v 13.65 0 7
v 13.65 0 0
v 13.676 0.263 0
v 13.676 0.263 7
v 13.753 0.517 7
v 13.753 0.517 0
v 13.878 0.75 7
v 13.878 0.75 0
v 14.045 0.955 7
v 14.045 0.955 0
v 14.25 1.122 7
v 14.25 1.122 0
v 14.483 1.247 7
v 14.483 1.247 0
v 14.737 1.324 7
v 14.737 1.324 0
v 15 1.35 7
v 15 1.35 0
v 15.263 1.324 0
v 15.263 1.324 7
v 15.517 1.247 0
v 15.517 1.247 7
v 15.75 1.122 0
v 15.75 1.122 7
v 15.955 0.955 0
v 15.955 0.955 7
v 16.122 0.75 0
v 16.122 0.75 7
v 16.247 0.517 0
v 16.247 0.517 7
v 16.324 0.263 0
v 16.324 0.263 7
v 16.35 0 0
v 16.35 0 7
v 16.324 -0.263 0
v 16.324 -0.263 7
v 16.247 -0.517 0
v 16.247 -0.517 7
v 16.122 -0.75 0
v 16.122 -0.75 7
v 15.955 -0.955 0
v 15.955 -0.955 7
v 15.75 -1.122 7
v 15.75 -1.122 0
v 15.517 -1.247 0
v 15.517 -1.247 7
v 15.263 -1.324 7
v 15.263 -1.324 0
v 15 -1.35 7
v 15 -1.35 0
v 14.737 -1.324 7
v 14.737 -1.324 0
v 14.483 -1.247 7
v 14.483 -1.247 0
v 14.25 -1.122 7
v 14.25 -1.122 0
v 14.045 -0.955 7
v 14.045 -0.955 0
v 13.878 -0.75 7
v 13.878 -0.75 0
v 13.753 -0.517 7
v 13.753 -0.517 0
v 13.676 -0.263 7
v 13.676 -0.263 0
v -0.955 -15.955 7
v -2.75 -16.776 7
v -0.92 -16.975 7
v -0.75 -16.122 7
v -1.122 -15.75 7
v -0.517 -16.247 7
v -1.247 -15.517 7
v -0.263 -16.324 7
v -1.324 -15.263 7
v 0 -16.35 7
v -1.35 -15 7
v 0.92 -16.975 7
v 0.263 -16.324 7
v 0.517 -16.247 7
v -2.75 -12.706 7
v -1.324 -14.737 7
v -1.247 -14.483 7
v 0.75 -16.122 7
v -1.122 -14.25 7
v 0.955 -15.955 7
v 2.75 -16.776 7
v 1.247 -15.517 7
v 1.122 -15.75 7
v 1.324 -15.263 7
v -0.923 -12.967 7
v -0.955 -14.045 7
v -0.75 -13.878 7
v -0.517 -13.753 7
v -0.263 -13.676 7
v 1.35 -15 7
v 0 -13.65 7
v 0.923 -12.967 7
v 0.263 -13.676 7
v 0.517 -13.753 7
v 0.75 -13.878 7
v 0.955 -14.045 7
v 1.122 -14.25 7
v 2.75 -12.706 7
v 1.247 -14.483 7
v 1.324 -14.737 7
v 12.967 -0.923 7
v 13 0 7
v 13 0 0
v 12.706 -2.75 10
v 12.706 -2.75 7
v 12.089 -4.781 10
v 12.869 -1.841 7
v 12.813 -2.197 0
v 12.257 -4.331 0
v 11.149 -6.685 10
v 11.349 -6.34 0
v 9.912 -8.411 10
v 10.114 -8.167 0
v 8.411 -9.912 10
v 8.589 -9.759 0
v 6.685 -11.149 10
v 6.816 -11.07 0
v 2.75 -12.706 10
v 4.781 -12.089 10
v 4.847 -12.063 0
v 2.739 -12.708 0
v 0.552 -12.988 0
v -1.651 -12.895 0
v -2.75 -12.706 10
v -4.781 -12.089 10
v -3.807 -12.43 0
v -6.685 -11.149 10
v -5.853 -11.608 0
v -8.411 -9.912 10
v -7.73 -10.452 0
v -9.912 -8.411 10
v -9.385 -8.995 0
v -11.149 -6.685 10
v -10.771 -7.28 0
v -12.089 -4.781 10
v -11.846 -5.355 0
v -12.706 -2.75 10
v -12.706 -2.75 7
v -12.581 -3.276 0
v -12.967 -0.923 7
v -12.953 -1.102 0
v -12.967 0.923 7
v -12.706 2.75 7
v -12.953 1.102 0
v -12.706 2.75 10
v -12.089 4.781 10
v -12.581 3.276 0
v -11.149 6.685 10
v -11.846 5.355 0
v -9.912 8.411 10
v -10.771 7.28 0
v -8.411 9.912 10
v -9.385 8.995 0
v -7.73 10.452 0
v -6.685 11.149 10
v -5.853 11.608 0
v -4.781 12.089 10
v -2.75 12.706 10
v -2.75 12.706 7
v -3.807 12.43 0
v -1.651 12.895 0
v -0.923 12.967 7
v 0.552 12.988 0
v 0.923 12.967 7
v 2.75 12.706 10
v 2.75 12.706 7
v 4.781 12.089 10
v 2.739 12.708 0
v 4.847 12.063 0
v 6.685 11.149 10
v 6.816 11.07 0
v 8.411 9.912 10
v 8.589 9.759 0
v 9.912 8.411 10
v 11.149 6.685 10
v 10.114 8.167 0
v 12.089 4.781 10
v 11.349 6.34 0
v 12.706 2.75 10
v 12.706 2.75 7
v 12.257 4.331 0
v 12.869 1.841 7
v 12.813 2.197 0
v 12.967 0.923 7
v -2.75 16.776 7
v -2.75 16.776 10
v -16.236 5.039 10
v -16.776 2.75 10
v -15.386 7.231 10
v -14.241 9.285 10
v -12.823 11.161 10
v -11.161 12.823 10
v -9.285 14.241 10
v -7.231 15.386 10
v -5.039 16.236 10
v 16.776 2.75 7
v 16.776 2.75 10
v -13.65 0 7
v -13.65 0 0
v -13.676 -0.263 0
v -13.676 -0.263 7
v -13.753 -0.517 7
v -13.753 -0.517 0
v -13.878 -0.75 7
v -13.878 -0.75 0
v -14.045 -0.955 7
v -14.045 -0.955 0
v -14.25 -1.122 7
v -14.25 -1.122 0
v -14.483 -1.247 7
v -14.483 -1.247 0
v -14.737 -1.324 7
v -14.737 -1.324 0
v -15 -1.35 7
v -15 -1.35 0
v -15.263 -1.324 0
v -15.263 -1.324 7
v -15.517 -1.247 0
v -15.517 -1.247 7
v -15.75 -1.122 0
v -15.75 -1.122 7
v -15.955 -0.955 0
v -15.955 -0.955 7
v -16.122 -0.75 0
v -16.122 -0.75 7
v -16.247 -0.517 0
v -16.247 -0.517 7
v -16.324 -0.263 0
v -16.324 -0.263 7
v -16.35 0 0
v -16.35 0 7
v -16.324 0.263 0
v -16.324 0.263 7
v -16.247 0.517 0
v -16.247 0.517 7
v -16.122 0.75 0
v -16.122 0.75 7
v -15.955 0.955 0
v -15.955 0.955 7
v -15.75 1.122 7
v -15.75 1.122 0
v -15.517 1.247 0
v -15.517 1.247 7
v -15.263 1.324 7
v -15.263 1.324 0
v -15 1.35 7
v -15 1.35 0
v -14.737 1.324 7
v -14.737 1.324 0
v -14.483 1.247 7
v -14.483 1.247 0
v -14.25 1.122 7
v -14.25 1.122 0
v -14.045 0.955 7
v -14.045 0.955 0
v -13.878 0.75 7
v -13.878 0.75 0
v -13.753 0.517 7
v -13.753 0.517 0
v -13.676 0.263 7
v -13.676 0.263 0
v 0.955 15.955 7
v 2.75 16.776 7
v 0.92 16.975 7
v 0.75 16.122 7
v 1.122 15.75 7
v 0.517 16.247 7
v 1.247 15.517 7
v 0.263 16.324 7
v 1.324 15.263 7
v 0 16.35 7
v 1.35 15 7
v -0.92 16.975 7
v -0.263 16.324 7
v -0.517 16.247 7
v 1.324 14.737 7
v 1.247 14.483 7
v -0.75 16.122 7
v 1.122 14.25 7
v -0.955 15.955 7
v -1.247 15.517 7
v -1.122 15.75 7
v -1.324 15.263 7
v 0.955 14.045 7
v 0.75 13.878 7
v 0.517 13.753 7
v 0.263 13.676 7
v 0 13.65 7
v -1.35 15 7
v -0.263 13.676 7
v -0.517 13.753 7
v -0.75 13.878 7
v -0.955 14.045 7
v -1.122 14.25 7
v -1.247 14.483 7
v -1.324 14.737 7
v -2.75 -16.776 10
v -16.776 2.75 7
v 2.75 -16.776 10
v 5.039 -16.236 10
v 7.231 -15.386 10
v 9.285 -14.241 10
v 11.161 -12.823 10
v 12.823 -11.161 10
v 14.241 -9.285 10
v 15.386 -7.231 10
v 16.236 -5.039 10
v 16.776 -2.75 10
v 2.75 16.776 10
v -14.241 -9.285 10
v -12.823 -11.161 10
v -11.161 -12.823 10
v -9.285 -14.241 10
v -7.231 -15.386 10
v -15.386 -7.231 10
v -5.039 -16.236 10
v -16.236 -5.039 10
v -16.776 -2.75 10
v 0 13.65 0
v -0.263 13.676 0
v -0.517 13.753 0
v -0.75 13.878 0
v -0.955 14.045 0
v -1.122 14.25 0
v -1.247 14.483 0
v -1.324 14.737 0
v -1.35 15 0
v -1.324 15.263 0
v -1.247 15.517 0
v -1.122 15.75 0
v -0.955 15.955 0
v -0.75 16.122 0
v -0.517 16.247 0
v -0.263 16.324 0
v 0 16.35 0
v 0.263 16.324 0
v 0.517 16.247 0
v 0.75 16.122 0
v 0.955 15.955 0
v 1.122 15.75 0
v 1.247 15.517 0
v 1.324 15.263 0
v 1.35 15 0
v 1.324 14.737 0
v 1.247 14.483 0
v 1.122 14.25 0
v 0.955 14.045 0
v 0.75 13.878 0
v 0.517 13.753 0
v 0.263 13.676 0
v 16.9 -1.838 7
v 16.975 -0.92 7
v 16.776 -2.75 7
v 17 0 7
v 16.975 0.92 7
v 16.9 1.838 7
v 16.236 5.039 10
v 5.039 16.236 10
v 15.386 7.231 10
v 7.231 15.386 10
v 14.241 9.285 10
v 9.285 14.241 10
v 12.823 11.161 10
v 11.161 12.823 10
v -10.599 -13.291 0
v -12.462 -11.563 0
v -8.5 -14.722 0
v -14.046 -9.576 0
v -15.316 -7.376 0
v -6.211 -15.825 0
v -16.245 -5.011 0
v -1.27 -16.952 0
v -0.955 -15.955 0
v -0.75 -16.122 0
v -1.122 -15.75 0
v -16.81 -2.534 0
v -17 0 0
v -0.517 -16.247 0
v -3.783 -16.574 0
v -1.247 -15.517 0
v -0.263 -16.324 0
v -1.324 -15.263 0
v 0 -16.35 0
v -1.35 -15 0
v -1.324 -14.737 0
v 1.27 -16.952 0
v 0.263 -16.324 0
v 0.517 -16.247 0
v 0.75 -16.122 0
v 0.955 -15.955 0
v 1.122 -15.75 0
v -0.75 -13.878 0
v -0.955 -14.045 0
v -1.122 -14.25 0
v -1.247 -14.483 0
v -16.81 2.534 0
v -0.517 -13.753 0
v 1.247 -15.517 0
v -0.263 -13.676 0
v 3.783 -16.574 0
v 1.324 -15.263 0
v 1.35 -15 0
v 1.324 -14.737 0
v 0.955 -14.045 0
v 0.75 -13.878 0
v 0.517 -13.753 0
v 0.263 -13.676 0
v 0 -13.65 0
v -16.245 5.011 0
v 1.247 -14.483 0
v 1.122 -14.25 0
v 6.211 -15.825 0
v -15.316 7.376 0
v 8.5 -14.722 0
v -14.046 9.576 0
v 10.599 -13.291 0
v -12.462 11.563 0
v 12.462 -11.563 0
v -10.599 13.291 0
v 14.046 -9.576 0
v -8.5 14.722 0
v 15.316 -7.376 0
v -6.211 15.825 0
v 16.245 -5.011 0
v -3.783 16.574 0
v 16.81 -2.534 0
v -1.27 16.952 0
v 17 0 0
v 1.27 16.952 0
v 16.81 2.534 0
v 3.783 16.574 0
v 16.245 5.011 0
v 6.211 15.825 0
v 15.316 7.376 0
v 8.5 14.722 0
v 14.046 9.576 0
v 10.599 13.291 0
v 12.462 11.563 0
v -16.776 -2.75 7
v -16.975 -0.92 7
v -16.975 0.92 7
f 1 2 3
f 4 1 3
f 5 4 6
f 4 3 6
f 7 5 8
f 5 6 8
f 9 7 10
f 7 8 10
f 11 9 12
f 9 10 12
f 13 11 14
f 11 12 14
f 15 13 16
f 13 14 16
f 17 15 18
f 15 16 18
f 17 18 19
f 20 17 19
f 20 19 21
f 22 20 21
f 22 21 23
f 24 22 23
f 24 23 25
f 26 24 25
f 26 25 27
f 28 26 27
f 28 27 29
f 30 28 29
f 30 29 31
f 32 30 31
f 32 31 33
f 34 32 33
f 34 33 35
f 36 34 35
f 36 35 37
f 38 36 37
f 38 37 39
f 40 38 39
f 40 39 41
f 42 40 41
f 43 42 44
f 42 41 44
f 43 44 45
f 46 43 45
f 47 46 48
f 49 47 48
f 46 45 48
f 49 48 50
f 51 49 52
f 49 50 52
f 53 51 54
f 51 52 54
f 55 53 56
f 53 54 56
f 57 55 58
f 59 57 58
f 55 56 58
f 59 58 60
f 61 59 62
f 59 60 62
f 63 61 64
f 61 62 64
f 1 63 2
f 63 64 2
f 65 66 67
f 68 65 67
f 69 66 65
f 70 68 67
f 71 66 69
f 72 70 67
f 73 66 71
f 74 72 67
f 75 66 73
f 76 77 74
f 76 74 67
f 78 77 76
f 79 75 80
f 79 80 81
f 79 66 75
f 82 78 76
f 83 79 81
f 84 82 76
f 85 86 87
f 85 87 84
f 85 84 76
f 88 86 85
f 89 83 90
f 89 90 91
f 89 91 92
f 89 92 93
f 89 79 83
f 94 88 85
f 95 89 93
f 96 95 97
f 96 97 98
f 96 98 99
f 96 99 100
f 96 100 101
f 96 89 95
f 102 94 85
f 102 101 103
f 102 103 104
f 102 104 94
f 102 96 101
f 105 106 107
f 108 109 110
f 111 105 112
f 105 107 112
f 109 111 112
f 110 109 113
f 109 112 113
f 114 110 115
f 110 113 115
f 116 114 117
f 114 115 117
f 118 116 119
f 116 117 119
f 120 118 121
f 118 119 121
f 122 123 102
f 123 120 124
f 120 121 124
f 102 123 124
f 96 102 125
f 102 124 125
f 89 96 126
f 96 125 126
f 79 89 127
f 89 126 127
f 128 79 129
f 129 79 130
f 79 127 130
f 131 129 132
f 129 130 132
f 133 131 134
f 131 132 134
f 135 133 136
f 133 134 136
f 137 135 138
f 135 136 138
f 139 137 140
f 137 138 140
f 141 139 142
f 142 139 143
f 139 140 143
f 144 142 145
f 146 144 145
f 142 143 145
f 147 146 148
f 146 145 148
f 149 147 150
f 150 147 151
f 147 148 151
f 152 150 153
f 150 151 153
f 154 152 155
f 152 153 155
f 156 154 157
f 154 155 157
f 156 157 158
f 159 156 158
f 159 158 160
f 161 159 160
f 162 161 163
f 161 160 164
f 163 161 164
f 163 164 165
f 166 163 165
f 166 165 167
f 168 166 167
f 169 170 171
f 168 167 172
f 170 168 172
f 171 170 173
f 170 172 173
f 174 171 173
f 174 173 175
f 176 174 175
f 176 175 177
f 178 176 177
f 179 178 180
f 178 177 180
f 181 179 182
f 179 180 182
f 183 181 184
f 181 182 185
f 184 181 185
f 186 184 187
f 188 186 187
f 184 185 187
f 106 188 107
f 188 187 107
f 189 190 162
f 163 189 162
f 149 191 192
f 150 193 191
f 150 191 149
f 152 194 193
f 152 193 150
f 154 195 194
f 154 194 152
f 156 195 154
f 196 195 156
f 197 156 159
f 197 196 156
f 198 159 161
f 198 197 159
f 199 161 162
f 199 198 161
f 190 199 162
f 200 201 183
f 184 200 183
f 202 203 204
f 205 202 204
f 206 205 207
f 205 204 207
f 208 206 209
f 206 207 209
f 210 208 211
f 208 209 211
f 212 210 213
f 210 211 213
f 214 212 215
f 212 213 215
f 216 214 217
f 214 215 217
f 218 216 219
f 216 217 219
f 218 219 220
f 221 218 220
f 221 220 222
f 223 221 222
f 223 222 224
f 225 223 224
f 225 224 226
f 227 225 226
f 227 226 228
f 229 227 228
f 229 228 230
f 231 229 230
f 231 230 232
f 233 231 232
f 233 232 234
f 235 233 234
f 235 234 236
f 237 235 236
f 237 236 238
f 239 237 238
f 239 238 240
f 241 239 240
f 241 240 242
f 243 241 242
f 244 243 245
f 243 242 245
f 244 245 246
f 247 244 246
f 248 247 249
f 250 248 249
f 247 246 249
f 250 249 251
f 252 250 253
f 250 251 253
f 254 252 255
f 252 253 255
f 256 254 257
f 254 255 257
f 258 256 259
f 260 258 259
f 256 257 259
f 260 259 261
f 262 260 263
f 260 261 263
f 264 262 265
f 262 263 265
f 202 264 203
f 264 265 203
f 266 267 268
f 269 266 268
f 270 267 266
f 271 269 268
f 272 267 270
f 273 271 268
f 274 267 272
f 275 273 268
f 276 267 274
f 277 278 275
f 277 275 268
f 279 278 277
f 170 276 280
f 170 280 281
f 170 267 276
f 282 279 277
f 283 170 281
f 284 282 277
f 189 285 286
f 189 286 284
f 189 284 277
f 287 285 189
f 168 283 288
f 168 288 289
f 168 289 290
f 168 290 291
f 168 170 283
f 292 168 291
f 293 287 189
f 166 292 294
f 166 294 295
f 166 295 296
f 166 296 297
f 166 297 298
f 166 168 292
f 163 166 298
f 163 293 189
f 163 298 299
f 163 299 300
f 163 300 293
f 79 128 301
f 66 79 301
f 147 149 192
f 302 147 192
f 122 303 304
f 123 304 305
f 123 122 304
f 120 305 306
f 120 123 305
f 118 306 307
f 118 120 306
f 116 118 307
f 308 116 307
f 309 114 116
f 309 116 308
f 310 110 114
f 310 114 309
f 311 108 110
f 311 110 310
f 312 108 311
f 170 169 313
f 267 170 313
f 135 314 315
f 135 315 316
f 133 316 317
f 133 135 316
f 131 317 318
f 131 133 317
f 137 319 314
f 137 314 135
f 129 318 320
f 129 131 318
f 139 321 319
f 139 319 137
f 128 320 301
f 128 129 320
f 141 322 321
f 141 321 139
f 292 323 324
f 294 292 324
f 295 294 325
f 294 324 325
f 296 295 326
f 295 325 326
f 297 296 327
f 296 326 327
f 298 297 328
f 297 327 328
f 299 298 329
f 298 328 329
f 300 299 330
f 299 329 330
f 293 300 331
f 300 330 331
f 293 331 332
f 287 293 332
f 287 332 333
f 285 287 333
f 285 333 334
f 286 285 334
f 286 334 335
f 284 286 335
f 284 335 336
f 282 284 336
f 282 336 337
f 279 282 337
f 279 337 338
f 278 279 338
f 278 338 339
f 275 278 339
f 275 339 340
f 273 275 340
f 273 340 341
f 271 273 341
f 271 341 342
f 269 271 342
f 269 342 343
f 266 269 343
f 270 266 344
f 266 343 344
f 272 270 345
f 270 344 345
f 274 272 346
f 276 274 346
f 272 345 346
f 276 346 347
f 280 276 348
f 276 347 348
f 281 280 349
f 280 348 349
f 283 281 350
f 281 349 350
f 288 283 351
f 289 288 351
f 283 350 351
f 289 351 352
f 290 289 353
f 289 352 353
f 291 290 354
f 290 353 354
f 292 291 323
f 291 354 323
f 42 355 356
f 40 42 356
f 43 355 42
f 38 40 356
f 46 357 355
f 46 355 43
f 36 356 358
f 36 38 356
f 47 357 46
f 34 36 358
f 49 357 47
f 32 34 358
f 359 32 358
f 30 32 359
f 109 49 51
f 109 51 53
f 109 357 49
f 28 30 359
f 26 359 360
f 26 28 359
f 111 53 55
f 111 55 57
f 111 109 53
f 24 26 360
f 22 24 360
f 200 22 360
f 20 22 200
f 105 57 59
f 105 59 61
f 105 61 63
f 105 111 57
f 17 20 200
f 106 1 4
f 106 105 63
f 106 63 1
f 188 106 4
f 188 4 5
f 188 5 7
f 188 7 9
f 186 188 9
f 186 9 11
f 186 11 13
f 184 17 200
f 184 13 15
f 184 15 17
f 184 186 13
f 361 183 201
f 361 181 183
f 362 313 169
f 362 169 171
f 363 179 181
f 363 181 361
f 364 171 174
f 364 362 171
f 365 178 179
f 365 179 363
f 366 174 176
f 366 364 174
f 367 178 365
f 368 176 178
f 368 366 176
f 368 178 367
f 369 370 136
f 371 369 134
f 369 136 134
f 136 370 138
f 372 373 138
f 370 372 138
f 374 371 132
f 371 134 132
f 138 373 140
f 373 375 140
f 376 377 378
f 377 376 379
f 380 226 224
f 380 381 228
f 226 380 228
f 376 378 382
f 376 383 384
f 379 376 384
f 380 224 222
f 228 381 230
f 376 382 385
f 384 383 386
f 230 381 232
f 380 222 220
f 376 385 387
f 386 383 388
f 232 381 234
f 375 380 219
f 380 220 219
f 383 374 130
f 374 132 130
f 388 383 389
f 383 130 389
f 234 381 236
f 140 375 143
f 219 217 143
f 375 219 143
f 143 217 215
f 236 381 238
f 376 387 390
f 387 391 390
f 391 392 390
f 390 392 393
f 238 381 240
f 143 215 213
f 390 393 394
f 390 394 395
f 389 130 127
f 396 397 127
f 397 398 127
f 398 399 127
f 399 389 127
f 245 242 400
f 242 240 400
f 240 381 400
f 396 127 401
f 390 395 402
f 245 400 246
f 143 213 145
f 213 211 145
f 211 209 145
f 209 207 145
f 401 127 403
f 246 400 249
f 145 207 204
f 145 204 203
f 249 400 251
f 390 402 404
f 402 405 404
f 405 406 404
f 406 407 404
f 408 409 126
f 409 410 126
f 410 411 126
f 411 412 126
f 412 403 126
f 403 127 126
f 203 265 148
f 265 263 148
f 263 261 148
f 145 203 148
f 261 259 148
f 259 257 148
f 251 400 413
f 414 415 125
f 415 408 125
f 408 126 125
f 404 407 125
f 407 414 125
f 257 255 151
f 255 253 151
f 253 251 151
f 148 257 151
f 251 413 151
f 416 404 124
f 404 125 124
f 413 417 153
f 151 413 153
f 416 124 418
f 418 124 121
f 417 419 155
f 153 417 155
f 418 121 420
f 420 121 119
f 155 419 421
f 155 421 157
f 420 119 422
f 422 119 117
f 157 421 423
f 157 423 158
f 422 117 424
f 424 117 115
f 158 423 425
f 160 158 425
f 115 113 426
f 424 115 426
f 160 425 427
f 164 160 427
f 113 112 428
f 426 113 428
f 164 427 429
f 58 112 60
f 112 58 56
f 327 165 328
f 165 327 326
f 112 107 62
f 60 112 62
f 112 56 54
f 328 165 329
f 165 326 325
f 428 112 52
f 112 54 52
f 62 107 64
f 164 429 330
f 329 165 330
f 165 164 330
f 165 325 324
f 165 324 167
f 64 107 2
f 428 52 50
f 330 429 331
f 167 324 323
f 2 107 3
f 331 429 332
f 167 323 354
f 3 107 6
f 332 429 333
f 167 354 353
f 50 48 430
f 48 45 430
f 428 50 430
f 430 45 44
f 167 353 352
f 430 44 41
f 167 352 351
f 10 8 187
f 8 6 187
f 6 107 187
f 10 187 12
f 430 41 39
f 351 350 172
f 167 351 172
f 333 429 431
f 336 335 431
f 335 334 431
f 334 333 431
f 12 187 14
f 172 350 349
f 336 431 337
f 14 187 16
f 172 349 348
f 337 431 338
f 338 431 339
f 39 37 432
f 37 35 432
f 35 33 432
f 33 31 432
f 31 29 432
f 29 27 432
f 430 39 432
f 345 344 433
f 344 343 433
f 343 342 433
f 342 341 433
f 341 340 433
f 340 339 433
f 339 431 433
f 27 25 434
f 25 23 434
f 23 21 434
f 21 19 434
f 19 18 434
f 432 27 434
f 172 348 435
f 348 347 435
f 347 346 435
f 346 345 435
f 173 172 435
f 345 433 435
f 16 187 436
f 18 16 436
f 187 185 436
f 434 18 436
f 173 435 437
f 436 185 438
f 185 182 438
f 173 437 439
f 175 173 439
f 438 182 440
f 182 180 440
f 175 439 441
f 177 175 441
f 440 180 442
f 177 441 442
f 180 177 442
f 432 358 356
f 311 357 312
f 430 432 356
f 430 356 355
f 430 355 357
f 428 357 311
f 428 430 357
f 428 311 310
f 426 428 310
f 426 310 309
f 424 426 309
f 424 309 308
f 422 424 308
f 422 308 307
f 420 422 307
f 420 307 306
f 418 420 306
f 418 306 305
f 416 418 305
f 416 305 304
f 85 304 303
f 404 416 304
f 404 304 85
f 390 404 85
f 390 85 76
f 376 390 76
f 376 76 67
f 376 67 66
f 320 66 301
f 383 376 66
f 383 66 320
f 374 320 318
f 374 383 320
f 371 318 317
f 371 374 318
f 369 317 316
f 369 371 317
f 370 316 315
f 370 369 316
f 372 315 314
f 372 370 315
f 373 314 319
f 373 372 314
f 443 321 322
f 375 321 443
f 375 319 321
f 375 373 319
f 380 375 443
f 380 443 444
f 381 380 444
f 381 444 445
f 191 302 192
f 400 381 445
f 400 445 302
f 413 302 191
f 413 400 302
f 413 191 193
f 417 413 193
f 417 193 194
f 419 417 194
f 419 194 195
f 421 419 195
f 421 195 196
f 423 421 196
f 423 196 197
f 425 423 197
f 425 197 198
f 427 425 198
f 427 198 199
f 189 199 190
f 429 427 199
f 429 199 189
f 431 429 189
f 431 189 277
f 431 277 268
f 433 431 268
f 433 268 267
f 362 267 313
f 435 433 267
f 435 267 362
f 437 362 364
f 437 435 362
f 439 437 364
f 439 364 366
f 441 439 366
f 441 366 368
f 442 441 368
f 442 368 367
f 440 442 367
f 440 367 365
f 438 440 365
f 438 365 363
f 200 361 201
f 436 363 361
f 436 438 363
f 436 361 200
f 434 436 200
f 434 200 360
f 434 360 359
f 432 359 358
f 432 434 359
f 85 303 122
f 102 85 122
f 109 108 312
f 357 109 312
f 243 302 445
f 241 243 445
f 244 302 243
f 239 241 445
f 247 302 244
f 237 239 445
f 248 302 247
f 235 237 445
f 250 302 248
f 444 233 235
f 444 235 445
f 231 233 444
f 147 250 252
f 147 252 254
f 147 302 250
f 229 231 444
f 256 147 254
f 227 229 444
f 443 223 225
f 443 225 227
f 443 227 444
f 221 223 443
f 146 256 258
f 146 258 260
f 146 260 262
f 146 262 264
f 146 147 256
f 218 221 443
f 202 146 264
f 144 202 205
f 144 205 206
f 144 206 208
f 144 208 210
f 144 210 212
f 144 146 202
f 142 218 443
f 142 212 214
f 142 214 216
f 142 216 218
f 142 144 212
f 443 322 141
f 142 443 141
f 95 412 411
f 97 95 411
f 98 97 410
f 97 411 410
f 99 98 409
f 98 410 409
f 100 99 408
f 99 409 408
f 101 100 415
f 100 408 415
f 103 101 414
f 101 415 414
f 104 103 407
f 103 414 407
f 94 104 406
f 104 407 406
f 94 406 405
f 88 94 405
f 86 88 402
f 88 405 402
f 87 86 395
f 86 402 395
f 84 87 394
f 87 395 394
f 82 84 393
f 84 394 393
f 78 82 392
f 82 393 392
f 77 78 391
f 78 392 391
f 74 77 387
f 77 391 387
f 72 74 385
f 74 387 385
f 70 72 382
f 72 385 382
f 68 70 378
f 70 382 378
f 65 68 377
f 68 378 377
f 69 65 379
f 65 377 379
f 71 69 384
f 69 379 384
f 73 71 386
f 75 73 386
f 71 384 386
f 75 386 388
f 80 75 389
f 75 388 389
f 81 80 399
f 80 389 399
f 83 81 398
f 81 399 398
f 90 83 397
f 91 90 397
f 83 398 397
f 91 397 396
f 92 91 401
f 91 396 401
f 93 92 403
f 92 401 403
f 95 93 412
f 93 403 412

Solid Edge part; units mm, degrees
sketch "Sketch1" plane through (0, 0, 0) normal (0, 0, 1) x (1, 0, 0)
  circle A0 centre (0, 0) radius 13
  circle A1 centre (0, 0) radius 17
extrude "Protrusion1" add sketch "Sketch1" along normal blind 10
hole "Hole_1" at (0, -15, 0) direction (0, 0, 1) diameter 2.7 end up to next
sketch "Sketch2" plane through (0, 0, 10) normal (0, 0, 1) x (-1, 0, 0)
  line L0 (-2.75, 12.7058) -> (2.75, 12.7058)
  line L1 (2.75, 12.7058) -> (2.75, 17.7796)
  line L2 (2.75, 17.7796) -> (-2.75, 17.7796)
  line L3 (-2.75, 17.7796) -> (-2.75, 16.7761)
  dimension "D1" = 5.5
  dimension "D2" = 2.75
extrude "ExtrudedCutout_1" cut sketch "Sketch2" against normal blind 3 material side at (0, -12.7558, 10)
pattern_circular "Pattern2" count 4 over 360 about axis through (0, 0, 0) along (0, 0, 1) of "Hole_1", "ExtrudedCutout_1"
